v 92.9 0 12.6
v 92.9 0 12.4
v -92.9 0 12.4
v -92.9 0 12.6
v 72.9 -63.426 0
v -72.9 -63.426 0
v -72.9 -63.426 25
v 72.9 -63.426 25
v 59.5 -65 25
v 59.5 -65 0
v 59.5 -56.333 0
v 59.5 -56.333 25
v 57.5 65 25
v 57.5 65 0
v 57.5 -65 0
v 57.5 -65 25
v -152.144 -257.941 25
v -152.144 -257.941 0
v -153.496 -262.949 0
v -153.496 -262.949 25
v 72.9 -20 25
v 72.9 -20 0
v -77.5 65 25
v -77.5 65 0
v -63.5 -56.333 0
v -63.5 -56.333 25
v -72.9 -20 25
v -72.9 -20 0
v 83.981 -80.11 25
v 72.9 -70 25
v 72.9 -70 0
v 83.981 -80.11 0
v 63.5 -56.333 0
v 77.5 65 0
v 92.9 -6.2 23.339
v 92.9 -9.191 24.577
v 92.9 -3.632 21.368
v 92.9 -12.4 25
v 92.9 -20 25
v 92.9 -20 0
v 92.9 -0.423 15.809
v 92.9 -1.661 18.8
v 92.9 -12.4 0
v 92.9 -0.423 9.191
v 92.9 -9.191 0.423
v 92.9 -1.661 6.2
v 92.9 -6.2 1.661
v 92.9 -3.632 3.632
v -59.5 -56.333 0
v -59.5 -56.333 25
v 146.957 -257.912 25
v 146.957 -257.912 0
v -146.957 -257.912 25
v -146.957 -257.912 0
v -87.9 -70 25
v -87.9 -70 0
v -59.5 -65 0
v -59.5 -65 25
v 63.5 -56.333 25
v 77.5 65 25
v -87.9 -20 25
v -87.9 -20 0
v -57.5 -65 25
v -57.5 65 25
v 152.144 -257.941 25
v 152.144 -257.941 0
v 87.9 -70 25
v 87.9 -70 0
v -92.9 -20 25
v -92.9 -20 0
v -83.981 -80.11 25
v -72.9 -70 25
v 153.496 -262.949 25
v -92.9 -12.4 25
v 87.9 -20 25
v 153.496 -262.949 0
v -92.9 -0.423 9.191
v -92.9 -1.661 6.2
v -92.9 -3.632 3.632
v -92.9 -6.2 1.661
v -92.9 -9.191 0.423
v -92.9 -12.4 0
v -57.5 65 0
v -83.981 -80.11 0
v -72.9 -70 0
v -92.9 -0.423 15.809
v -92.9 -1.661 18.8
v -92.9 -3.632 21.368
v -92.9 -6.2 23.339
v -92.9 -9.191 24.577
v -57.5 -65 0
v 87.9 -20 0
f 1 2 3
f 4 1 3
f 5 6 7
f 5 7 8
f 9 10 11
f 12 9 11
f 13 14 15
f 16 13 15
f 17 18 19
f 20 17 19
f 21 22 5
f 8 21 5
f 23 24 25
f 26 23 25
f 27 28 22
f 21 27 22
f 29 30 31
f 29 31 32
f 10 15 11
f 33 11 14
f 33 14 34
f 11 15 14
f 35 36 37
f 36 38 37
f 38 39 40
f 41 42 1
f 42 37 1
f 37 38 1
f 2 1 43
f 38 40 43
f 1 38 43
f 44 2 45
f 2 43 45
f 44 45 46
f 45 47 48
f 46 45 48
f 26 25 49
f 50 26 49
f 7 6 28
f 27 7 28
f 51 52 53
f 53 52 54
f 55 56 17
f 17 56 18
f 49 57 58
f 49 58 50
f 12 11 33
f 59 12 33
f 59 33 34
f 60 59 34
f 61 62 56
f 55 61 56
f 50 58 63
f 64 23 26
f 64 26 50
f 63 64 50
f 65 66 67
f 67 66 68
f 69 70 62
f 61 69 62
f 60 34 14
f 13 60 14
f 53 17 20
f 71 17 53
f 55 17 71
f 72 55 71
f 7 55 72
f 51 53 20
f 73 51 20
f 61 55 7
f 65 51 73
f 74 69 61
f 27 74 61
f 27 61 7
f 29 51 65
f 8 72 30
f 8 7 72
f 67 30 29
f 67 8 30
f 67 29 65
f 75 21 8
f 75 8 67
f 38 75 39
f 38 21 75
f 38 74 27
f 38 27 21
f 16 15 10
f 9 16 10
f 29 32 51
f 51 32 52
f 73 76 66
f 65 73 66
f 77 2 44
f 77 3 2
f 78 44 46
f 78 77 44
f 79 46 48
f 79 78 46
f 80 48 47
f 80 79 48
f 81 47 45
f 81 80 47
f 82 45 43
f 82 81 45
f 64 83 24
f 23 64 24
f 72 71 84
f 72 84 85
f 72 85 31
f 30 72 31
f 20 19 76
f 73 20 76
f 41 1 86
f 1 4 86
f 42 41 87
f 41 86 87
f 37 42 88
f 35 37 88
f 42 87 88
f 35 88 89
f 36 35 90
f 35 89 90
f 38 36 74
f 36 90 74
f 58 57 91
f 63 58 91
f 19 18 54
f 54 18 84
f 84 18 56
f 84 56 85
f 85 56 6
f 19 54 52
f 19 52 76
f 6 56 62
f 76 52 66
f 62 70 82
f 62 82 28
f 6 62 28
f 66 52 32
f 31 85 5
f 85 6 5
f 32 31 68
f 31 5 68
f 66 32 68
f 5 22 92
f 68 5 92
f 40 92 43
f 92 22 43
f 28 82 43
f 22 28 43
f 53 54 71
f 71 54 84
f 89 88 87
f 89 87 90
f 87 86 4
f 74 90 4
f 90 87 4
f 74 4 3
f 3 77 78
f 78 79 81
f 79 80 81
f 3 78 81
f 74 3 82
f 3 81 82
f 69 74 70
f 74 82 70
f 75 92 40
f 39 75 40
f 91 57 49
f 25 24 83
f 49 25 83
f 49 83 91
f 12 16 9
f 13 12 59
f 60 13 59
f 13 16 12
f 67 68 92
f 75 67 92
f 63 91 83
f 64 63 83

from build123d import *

# Parameters (mm, degrees)
F0_W     = 145.8
F0_H     = 6.5740418434
F1_DEPTH = 25
F2_W     = 2
F2_H     = 8.6666666667
F3_DEPTH = 25
F4_R     = 12.4


# Not quite as in the source:
# - a feature names something its author has since deleted; it is built from what else it names


with BuildPart() as f1:
    # F0 (on Top) → F1 (new body)
    with BuildSketch(Plane.XY):
        Polygon((153.4961182735, -262.9485861983), (152.1440880223, -257.9410667492), (87.9, -70), (87.9, -20), (92.9, -20), (92.9, 0), (88.236759305, 0), (-88.236759305, 0), (-92.9, 0), (-92.9, -20), (-87.9, -20), (-87.9, -70), (-152.1440880223, -257.9410667492), (-153.4961182735, -262.9485861983), align=None)
        Polygon((83.9809148248, -80.1100606648), (146.9573287566, -257.9124928518), (-146.9573287566, -257.9124928518), (-83.9809148248, -80.1100606648), (-72.9, -70), (-72.9, -63.4259581566), (-72.9, -20), (72.9, -20), (72.9, -63.4259581566), (72.9, -70), align=None, mode=Mode.SUBTRACT)
        with Locations((0, -66.7129790783)):
            Rectangle(F0_W, F0_H)
    extrude(amount=F1_DEPTH)

    # F4
    f4_edges = [f1.edges().sort_by_distance(p)[0] for p in [
        (0, 0, 25),
        (0, 0, 0),
    ]]
    fillet(f4_edges, radius=F4_R)


with BuildPart() as f3:
    # F2 (on Top) → F3 (new body)
    with BuildSketch(Plane.XY):
        Polygon((-57.5, -56.3333333333), (-57.5, 0), (-57.5, 65), (-77.5, 65), (-63.5, -56.3333333333), (-59.5, -56.3333333333), align=None)
        with Locations((-58.5, -60.6666666667)):
            Rectangle(F2_W, F2_H)
    extrude(amount=F3_DEPTH)


with BuildPart() as f3b:
    # F2 (on Top) → F3, piece 2 (new body)
    with BuildSketch(Plane.XY):
        Polygon((57.5, 65), (57.5, 0), (57.5, -56.3333333333), (59.5, -56.3333333333), (63.5, -56.3333333333), (77.5, 65), align=None)
        with Locations((58.5, -60.6666666667)):
            Rectangle(F2_W, F2_H)
    extrude(amount=F3_DEPTH)


solid = Compound([f1.part, f3.part, f3b.part])
